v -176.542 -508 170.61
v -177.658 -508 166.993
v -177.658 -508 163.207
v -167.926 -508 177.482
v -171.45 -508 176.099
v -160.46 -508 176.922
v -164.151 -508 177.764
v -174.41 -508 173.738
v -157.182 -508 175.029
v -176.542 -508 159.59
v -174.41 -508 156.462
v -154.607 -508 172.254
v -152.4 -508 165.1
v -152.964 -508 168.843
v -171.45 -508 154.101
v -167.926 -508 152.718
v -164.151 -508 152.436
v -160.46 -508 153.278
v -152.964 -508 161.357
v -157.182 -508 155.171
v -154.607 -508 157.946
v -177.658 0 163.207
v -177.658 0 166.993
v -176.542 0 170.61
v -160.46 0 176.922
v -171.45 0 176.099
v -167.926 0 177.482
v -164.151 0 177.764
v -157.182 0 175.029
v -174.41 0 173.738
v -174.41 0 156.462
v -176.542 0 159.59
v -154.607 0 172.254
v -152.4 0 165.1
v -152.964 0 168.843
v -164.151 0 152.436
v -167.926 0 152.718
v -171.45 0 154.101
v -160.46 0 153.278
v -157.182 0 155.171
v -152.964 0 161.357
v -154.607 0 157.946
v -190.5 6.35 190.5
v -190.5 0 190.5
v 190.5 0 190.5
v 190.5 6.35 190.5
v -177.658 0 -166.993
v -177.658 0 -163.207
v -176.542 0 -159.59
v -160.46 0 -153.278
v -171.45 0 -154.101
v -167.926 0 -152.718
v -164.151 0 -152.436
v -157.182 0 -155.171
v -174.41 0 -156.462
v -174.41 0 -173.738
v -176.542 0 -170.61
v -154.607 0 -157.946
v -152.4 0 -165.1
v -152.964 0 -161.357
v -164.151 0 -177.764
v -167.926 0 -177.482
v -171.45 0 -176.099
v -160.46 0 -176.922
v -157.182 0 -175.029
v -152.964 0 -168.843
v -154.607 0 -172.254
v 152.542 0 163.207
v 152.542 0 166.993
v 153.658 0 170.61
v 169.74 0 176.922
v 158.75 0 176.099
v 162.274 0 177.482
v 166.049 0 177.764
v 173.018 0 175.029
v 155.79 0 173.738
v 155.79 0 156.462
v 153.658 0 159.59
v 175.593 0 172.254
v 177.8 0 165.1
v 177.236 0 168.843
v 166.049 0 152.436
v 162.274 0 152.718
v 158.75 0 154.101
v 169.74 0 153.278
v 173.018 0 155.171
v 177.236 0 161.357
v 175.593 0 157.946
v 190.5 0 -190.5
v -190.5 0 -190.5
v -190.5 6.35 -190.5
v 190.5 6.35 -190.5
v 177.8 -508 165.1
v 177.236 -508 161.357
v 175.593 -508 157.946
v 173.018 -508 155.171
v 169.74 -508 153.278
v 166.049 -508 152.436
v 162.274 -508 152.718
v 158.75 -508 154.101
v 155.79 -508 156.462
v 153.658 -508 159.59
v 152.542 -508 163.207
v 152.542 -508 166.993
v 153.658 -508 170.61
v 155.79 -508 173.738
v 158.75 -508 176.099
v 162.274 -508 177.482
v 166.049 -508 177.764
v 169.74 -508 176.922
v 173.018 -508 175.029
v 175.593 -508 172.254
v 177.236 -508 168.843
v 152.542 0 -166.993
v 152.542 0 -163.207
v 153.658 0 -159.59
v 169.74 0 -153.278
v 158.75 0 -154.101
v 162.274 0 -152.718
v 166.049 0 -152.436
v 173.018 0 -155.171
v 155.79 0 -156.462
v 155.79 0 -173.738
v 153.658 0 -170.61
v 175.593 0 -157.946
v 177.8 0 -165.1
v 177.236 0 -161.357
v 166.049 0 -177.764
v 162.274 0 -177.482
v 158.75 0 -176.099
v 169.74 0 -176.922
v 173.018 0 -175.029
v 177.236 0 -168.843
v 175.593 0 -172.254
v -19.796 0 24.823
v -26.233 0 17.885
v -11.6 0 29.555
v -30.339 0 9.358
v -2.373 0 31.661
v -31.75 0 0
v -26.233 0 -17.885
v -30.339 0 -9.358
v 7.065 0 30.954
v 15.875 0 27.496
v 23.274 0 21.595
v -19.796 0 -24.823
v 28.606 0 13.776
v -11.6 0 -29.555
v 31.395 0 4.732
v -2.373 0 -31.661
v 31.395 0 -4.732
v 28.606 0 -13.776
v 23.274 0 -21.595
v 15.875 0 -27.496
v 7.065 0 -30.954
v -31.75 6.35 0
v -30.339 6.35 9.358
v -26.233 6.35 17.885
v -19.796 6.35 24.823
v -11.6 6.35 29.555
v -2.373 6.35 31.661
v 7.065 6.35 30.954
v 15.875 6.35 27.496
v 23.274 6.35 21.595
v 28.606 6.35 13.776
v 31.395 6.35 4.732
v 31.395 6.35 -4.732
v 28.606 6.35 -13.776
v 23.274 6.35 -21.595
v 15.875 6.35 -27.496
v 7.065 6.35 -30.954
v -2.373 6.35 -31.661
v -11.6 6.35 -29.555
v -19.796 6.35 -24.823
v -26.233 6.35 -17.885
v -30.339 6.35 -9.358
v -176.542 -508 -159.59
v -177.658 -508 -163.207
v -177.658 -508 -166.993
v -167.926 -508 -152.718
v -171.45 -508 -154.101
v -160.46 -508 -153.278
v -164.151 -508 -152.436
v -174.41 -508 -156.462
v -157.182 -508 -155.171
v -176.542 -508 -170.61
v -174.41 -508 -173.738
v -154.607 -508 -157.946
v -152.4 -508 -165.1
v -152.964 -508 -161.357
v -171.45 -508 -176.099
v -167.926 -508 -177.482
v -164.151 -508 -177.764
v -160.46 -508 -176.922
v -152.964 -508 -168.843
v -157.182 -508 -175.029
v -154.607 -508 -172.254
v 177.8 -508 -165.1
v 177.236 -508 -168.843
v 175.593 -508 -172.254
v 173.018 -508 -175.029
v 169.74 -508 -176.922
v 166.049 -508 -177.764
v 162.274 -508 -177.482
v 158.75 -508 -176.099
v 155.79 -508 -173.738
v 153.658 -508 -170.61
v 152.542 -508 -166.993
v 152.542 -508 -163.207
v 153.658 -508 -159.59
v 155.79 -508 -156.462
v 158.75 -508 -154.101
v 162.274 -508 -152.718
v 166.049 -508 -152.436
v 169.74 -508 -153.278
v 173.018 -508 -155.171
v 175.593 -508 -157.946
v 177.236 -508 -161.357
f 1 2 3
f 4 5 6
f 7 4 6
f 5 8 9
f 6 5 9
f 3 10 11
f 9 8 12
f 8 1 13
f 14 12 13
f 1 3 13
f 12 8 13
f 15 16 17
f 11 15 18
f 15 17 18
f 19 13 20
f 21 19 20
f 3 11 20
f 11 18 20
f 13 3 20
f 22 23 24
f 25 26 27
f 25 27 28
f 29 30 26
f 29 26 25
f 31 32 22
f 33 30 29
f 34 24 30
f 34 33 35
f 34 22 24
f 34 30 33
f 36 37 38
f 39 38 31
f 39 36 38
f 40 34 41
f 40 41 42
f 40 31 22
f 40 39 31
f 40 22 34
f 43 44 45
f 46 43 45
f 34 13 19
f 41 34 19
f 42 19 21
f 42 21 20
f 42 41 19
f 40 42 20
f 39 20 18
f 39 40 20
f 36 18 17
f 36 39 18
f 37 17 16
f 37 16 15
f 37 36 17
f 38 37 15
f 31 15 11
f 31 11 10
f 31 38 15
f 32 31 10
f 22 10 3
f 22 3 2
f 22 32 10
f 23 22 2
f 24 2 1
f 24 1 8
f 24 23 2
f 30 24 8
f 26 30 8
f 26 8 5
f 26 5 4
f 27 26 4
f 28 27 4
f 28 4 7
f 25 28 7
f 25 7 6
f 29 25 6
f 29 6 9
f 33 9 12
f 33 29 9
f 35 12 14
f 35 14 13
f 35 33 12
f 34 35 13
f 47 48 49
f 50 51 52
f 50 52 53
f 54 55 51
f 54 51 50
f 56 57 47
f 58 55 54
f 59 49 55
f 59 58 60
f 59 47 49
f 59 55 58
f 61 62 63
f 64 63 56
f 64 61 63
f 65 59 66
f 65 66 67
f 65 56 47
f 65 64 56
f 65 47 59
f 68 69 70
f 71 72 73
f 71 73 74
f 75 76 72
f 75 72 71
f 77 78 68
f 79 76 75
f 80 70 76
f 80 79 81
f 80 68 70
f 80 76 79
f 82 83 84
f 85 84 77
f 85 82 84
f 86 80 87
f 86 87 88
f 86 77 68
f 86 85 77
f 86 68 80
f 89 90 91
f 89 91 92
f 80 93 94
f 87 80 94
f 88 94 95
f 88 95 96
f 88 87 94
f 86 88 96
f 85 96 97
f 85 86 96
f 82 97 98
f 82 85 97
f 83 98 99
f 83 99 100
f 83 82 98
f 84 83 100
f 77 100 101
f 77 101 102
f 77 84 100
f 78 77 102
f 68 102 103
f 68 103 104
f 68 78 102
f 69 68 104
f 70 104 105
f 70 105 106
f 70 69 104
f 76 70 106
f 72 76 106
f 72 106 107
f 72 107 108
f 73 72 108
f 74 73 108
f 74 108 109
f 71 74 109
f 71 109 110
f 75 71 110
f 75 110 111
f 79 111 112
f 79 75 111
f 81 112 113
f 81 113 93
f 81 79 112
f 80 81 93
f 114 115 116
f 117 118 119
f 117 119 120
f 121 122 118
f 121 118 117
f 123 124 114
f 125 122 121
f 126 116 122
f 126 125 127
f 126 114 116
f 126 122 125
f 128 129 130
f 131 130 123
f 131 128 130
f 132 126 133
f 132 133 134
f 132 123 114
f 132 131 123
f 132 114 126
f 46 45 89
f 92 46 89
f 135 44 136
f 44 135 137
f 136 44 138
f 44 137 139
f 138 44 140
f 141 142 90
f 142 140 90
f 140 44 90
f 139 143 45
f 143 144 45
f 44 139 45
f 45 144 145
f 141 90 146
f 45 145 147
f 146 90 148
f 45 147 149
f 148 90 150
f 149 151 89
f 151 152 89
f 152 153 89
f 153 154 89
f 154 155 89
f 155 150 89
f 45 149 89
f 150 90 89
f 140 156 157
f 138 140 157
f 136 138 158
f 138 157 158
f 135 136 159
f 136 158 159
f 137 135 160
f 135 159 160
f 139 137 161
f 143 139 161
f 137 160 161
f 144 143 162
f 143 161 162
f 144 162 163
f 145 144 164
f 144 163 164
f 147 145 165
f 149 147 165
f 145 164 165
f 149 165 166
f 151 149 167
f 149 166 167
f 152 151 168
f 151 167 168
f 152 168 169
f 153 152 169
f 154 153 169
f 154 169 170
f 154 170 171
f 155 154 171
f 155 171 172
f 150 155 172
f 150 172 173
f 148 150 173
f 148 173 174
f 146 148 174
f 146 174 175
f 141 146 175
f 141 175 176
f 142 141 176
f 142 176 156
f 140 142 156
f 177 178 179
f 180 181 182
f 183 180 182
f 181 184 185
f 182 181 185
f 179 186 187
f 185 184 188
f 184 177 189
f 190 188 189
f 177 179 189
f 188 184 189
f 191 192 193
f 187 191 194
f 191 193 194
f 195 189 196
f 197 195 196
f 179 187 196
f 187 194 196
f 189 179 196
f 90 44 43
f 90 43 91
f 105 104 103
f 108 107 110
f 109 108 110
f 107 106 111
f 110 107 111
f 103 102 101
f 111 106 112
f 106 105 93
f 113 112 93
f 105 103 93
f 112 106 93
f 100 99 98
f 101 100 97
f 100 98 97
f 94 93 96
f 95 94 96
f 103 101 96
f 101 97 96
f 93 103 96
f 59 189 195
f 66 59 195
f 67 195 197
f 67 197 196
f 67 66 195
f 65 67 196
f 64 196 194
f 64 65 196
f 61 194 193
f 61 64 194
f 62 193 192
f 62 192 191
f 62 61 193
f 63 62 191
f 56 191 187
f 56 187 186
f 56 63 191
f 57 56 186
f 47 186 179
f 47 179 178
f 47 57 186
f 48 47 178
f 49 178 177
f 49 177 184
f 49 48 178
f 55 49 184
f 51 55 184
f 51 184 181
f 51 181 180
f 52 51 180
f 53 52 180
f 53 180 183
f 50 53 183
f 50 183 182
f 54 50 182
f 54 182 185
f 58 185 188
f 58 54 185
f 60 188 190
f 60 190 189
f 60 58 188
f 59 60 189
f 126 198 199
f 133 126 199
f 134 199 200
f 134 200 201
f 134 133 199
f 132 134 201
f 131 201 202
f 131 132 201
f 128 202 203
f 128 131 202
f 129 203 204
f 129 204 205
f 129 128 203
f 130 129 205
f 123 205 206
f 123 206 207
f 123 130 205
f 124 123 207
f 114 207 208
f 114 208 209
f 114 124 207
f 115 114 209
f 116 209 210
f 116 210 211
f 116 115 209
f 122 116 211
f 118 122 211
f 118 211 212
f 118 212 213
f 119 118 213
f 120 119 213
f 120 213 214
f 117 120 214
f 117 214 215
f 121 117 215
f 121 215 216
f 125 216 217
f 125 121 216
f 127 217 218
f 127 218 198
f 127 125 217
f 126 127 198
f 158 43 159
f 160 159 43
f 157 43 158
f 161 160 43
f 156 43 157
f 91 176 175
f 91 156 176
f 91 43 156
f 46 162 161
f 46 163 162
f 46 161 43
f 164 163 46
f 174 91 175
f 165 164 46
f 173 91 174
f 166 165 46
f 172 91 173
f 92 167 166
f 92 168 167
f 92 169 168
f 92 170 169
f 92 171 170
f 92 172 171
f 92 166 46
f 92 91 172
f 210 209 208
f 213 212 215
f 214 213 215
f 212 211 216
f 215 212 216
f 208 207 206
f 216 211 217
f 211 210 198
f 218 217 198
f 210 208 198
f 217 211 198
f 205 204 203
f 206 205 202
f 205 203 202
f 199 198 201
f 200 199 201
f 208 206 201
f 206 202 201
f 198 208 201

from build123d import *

# Parameters (mm, degrees)
SKETCH1_W        = 381
SKETCH1_H        = 381
EXTRUDE1_DEPTH   = 6.35
SKETCH2_R        = 31.75
EXTRUDE2_DEPTH   = 7.35
SKETCH3_R        = 12.7
EXTRUDE3_DEPTH   = 508
EXTRUDE3_2_DEPTH = 508
EXTRUDE3_3_DEPTH = 508
EXTRUDE3_4_DEPTH = 508


with BuildPart() as part:
    # Sketch1 → Extrude1 (new body)
    with BuildSketch(Plane(origin=(0, 0, 0), x_dir=(1, 0, 0), z_dir=(0, 1, 0))):
        Rectangle(SKETCH1_W, SKETCH1_H)
    extrude(amount=EXTRUDE1_DEPTH)

    # Sketch2 → Extrude2 (cut, through all)
    with BuildSketch(Plane(origin=(0, 6.35, 0), x_dir=(-1, 0, 0), z_dir=(0, 1, 0))):
        Circle(SKETCH2_R)
    extrude(amount=-EXTRUDE2_DEPTH, mode=Mode.SUBTRACT)


with BuildPart() as body_2:
    # Sketch3 → Extrude3 (new body)
    with BuildSketch(Plane(origin=(0, 0, 0), x_dir=(1, 0, 0), z_dir=(0, 1, 0))):
        with Locations((165.1, 165.1)):
            Circle(SKETCH3_R)
    extrude(amount=-EXTRUDE3_DEPTH)


with BuildPart() as body_3:
    # Sketch3 → Extrude3 2 (new body)
    with BuildSketch(Plane(origin=(0, 0, 0), x_dir=(1, 0, 0), z_dir=(0, 1, 0))):
        with Locations((-165.1, 165.1)):
            Circle(SKETCH3_R)
    extrude(amount=-EXTRUDE3_2_DEPTH)


with BuildPart() as body_4:
    # Sketch3 → Extrude3 3 (new body)
    with BuildSketch(Plane(origin=(0, 0, 0), x_dir=(1, 0, 0), z_dir=(0, 1, 0))):
        with Locations((165.1, -165.1)):
            Circle(SKETCH3_R)
    extrude(amount=-EXTRUDE3_3_DEPTH)


with BuildPart() as body_5:
    # Sketch3 → Extrude3 4 (new body)
    with BuildSketch(Plane(origin=(0, 0, 0), x_dir=(1, 0, 0), z_dir=(0, 1, 0))):
        with Locations((-165.1, -165.1)):
            Circle(SKETCH3_R)
    extrude(amount=-EXTRUDE3_4_DEPTH)


solid = Compound([part.part, body_2.part, body_3.part, body_4.part, body_5.part])
